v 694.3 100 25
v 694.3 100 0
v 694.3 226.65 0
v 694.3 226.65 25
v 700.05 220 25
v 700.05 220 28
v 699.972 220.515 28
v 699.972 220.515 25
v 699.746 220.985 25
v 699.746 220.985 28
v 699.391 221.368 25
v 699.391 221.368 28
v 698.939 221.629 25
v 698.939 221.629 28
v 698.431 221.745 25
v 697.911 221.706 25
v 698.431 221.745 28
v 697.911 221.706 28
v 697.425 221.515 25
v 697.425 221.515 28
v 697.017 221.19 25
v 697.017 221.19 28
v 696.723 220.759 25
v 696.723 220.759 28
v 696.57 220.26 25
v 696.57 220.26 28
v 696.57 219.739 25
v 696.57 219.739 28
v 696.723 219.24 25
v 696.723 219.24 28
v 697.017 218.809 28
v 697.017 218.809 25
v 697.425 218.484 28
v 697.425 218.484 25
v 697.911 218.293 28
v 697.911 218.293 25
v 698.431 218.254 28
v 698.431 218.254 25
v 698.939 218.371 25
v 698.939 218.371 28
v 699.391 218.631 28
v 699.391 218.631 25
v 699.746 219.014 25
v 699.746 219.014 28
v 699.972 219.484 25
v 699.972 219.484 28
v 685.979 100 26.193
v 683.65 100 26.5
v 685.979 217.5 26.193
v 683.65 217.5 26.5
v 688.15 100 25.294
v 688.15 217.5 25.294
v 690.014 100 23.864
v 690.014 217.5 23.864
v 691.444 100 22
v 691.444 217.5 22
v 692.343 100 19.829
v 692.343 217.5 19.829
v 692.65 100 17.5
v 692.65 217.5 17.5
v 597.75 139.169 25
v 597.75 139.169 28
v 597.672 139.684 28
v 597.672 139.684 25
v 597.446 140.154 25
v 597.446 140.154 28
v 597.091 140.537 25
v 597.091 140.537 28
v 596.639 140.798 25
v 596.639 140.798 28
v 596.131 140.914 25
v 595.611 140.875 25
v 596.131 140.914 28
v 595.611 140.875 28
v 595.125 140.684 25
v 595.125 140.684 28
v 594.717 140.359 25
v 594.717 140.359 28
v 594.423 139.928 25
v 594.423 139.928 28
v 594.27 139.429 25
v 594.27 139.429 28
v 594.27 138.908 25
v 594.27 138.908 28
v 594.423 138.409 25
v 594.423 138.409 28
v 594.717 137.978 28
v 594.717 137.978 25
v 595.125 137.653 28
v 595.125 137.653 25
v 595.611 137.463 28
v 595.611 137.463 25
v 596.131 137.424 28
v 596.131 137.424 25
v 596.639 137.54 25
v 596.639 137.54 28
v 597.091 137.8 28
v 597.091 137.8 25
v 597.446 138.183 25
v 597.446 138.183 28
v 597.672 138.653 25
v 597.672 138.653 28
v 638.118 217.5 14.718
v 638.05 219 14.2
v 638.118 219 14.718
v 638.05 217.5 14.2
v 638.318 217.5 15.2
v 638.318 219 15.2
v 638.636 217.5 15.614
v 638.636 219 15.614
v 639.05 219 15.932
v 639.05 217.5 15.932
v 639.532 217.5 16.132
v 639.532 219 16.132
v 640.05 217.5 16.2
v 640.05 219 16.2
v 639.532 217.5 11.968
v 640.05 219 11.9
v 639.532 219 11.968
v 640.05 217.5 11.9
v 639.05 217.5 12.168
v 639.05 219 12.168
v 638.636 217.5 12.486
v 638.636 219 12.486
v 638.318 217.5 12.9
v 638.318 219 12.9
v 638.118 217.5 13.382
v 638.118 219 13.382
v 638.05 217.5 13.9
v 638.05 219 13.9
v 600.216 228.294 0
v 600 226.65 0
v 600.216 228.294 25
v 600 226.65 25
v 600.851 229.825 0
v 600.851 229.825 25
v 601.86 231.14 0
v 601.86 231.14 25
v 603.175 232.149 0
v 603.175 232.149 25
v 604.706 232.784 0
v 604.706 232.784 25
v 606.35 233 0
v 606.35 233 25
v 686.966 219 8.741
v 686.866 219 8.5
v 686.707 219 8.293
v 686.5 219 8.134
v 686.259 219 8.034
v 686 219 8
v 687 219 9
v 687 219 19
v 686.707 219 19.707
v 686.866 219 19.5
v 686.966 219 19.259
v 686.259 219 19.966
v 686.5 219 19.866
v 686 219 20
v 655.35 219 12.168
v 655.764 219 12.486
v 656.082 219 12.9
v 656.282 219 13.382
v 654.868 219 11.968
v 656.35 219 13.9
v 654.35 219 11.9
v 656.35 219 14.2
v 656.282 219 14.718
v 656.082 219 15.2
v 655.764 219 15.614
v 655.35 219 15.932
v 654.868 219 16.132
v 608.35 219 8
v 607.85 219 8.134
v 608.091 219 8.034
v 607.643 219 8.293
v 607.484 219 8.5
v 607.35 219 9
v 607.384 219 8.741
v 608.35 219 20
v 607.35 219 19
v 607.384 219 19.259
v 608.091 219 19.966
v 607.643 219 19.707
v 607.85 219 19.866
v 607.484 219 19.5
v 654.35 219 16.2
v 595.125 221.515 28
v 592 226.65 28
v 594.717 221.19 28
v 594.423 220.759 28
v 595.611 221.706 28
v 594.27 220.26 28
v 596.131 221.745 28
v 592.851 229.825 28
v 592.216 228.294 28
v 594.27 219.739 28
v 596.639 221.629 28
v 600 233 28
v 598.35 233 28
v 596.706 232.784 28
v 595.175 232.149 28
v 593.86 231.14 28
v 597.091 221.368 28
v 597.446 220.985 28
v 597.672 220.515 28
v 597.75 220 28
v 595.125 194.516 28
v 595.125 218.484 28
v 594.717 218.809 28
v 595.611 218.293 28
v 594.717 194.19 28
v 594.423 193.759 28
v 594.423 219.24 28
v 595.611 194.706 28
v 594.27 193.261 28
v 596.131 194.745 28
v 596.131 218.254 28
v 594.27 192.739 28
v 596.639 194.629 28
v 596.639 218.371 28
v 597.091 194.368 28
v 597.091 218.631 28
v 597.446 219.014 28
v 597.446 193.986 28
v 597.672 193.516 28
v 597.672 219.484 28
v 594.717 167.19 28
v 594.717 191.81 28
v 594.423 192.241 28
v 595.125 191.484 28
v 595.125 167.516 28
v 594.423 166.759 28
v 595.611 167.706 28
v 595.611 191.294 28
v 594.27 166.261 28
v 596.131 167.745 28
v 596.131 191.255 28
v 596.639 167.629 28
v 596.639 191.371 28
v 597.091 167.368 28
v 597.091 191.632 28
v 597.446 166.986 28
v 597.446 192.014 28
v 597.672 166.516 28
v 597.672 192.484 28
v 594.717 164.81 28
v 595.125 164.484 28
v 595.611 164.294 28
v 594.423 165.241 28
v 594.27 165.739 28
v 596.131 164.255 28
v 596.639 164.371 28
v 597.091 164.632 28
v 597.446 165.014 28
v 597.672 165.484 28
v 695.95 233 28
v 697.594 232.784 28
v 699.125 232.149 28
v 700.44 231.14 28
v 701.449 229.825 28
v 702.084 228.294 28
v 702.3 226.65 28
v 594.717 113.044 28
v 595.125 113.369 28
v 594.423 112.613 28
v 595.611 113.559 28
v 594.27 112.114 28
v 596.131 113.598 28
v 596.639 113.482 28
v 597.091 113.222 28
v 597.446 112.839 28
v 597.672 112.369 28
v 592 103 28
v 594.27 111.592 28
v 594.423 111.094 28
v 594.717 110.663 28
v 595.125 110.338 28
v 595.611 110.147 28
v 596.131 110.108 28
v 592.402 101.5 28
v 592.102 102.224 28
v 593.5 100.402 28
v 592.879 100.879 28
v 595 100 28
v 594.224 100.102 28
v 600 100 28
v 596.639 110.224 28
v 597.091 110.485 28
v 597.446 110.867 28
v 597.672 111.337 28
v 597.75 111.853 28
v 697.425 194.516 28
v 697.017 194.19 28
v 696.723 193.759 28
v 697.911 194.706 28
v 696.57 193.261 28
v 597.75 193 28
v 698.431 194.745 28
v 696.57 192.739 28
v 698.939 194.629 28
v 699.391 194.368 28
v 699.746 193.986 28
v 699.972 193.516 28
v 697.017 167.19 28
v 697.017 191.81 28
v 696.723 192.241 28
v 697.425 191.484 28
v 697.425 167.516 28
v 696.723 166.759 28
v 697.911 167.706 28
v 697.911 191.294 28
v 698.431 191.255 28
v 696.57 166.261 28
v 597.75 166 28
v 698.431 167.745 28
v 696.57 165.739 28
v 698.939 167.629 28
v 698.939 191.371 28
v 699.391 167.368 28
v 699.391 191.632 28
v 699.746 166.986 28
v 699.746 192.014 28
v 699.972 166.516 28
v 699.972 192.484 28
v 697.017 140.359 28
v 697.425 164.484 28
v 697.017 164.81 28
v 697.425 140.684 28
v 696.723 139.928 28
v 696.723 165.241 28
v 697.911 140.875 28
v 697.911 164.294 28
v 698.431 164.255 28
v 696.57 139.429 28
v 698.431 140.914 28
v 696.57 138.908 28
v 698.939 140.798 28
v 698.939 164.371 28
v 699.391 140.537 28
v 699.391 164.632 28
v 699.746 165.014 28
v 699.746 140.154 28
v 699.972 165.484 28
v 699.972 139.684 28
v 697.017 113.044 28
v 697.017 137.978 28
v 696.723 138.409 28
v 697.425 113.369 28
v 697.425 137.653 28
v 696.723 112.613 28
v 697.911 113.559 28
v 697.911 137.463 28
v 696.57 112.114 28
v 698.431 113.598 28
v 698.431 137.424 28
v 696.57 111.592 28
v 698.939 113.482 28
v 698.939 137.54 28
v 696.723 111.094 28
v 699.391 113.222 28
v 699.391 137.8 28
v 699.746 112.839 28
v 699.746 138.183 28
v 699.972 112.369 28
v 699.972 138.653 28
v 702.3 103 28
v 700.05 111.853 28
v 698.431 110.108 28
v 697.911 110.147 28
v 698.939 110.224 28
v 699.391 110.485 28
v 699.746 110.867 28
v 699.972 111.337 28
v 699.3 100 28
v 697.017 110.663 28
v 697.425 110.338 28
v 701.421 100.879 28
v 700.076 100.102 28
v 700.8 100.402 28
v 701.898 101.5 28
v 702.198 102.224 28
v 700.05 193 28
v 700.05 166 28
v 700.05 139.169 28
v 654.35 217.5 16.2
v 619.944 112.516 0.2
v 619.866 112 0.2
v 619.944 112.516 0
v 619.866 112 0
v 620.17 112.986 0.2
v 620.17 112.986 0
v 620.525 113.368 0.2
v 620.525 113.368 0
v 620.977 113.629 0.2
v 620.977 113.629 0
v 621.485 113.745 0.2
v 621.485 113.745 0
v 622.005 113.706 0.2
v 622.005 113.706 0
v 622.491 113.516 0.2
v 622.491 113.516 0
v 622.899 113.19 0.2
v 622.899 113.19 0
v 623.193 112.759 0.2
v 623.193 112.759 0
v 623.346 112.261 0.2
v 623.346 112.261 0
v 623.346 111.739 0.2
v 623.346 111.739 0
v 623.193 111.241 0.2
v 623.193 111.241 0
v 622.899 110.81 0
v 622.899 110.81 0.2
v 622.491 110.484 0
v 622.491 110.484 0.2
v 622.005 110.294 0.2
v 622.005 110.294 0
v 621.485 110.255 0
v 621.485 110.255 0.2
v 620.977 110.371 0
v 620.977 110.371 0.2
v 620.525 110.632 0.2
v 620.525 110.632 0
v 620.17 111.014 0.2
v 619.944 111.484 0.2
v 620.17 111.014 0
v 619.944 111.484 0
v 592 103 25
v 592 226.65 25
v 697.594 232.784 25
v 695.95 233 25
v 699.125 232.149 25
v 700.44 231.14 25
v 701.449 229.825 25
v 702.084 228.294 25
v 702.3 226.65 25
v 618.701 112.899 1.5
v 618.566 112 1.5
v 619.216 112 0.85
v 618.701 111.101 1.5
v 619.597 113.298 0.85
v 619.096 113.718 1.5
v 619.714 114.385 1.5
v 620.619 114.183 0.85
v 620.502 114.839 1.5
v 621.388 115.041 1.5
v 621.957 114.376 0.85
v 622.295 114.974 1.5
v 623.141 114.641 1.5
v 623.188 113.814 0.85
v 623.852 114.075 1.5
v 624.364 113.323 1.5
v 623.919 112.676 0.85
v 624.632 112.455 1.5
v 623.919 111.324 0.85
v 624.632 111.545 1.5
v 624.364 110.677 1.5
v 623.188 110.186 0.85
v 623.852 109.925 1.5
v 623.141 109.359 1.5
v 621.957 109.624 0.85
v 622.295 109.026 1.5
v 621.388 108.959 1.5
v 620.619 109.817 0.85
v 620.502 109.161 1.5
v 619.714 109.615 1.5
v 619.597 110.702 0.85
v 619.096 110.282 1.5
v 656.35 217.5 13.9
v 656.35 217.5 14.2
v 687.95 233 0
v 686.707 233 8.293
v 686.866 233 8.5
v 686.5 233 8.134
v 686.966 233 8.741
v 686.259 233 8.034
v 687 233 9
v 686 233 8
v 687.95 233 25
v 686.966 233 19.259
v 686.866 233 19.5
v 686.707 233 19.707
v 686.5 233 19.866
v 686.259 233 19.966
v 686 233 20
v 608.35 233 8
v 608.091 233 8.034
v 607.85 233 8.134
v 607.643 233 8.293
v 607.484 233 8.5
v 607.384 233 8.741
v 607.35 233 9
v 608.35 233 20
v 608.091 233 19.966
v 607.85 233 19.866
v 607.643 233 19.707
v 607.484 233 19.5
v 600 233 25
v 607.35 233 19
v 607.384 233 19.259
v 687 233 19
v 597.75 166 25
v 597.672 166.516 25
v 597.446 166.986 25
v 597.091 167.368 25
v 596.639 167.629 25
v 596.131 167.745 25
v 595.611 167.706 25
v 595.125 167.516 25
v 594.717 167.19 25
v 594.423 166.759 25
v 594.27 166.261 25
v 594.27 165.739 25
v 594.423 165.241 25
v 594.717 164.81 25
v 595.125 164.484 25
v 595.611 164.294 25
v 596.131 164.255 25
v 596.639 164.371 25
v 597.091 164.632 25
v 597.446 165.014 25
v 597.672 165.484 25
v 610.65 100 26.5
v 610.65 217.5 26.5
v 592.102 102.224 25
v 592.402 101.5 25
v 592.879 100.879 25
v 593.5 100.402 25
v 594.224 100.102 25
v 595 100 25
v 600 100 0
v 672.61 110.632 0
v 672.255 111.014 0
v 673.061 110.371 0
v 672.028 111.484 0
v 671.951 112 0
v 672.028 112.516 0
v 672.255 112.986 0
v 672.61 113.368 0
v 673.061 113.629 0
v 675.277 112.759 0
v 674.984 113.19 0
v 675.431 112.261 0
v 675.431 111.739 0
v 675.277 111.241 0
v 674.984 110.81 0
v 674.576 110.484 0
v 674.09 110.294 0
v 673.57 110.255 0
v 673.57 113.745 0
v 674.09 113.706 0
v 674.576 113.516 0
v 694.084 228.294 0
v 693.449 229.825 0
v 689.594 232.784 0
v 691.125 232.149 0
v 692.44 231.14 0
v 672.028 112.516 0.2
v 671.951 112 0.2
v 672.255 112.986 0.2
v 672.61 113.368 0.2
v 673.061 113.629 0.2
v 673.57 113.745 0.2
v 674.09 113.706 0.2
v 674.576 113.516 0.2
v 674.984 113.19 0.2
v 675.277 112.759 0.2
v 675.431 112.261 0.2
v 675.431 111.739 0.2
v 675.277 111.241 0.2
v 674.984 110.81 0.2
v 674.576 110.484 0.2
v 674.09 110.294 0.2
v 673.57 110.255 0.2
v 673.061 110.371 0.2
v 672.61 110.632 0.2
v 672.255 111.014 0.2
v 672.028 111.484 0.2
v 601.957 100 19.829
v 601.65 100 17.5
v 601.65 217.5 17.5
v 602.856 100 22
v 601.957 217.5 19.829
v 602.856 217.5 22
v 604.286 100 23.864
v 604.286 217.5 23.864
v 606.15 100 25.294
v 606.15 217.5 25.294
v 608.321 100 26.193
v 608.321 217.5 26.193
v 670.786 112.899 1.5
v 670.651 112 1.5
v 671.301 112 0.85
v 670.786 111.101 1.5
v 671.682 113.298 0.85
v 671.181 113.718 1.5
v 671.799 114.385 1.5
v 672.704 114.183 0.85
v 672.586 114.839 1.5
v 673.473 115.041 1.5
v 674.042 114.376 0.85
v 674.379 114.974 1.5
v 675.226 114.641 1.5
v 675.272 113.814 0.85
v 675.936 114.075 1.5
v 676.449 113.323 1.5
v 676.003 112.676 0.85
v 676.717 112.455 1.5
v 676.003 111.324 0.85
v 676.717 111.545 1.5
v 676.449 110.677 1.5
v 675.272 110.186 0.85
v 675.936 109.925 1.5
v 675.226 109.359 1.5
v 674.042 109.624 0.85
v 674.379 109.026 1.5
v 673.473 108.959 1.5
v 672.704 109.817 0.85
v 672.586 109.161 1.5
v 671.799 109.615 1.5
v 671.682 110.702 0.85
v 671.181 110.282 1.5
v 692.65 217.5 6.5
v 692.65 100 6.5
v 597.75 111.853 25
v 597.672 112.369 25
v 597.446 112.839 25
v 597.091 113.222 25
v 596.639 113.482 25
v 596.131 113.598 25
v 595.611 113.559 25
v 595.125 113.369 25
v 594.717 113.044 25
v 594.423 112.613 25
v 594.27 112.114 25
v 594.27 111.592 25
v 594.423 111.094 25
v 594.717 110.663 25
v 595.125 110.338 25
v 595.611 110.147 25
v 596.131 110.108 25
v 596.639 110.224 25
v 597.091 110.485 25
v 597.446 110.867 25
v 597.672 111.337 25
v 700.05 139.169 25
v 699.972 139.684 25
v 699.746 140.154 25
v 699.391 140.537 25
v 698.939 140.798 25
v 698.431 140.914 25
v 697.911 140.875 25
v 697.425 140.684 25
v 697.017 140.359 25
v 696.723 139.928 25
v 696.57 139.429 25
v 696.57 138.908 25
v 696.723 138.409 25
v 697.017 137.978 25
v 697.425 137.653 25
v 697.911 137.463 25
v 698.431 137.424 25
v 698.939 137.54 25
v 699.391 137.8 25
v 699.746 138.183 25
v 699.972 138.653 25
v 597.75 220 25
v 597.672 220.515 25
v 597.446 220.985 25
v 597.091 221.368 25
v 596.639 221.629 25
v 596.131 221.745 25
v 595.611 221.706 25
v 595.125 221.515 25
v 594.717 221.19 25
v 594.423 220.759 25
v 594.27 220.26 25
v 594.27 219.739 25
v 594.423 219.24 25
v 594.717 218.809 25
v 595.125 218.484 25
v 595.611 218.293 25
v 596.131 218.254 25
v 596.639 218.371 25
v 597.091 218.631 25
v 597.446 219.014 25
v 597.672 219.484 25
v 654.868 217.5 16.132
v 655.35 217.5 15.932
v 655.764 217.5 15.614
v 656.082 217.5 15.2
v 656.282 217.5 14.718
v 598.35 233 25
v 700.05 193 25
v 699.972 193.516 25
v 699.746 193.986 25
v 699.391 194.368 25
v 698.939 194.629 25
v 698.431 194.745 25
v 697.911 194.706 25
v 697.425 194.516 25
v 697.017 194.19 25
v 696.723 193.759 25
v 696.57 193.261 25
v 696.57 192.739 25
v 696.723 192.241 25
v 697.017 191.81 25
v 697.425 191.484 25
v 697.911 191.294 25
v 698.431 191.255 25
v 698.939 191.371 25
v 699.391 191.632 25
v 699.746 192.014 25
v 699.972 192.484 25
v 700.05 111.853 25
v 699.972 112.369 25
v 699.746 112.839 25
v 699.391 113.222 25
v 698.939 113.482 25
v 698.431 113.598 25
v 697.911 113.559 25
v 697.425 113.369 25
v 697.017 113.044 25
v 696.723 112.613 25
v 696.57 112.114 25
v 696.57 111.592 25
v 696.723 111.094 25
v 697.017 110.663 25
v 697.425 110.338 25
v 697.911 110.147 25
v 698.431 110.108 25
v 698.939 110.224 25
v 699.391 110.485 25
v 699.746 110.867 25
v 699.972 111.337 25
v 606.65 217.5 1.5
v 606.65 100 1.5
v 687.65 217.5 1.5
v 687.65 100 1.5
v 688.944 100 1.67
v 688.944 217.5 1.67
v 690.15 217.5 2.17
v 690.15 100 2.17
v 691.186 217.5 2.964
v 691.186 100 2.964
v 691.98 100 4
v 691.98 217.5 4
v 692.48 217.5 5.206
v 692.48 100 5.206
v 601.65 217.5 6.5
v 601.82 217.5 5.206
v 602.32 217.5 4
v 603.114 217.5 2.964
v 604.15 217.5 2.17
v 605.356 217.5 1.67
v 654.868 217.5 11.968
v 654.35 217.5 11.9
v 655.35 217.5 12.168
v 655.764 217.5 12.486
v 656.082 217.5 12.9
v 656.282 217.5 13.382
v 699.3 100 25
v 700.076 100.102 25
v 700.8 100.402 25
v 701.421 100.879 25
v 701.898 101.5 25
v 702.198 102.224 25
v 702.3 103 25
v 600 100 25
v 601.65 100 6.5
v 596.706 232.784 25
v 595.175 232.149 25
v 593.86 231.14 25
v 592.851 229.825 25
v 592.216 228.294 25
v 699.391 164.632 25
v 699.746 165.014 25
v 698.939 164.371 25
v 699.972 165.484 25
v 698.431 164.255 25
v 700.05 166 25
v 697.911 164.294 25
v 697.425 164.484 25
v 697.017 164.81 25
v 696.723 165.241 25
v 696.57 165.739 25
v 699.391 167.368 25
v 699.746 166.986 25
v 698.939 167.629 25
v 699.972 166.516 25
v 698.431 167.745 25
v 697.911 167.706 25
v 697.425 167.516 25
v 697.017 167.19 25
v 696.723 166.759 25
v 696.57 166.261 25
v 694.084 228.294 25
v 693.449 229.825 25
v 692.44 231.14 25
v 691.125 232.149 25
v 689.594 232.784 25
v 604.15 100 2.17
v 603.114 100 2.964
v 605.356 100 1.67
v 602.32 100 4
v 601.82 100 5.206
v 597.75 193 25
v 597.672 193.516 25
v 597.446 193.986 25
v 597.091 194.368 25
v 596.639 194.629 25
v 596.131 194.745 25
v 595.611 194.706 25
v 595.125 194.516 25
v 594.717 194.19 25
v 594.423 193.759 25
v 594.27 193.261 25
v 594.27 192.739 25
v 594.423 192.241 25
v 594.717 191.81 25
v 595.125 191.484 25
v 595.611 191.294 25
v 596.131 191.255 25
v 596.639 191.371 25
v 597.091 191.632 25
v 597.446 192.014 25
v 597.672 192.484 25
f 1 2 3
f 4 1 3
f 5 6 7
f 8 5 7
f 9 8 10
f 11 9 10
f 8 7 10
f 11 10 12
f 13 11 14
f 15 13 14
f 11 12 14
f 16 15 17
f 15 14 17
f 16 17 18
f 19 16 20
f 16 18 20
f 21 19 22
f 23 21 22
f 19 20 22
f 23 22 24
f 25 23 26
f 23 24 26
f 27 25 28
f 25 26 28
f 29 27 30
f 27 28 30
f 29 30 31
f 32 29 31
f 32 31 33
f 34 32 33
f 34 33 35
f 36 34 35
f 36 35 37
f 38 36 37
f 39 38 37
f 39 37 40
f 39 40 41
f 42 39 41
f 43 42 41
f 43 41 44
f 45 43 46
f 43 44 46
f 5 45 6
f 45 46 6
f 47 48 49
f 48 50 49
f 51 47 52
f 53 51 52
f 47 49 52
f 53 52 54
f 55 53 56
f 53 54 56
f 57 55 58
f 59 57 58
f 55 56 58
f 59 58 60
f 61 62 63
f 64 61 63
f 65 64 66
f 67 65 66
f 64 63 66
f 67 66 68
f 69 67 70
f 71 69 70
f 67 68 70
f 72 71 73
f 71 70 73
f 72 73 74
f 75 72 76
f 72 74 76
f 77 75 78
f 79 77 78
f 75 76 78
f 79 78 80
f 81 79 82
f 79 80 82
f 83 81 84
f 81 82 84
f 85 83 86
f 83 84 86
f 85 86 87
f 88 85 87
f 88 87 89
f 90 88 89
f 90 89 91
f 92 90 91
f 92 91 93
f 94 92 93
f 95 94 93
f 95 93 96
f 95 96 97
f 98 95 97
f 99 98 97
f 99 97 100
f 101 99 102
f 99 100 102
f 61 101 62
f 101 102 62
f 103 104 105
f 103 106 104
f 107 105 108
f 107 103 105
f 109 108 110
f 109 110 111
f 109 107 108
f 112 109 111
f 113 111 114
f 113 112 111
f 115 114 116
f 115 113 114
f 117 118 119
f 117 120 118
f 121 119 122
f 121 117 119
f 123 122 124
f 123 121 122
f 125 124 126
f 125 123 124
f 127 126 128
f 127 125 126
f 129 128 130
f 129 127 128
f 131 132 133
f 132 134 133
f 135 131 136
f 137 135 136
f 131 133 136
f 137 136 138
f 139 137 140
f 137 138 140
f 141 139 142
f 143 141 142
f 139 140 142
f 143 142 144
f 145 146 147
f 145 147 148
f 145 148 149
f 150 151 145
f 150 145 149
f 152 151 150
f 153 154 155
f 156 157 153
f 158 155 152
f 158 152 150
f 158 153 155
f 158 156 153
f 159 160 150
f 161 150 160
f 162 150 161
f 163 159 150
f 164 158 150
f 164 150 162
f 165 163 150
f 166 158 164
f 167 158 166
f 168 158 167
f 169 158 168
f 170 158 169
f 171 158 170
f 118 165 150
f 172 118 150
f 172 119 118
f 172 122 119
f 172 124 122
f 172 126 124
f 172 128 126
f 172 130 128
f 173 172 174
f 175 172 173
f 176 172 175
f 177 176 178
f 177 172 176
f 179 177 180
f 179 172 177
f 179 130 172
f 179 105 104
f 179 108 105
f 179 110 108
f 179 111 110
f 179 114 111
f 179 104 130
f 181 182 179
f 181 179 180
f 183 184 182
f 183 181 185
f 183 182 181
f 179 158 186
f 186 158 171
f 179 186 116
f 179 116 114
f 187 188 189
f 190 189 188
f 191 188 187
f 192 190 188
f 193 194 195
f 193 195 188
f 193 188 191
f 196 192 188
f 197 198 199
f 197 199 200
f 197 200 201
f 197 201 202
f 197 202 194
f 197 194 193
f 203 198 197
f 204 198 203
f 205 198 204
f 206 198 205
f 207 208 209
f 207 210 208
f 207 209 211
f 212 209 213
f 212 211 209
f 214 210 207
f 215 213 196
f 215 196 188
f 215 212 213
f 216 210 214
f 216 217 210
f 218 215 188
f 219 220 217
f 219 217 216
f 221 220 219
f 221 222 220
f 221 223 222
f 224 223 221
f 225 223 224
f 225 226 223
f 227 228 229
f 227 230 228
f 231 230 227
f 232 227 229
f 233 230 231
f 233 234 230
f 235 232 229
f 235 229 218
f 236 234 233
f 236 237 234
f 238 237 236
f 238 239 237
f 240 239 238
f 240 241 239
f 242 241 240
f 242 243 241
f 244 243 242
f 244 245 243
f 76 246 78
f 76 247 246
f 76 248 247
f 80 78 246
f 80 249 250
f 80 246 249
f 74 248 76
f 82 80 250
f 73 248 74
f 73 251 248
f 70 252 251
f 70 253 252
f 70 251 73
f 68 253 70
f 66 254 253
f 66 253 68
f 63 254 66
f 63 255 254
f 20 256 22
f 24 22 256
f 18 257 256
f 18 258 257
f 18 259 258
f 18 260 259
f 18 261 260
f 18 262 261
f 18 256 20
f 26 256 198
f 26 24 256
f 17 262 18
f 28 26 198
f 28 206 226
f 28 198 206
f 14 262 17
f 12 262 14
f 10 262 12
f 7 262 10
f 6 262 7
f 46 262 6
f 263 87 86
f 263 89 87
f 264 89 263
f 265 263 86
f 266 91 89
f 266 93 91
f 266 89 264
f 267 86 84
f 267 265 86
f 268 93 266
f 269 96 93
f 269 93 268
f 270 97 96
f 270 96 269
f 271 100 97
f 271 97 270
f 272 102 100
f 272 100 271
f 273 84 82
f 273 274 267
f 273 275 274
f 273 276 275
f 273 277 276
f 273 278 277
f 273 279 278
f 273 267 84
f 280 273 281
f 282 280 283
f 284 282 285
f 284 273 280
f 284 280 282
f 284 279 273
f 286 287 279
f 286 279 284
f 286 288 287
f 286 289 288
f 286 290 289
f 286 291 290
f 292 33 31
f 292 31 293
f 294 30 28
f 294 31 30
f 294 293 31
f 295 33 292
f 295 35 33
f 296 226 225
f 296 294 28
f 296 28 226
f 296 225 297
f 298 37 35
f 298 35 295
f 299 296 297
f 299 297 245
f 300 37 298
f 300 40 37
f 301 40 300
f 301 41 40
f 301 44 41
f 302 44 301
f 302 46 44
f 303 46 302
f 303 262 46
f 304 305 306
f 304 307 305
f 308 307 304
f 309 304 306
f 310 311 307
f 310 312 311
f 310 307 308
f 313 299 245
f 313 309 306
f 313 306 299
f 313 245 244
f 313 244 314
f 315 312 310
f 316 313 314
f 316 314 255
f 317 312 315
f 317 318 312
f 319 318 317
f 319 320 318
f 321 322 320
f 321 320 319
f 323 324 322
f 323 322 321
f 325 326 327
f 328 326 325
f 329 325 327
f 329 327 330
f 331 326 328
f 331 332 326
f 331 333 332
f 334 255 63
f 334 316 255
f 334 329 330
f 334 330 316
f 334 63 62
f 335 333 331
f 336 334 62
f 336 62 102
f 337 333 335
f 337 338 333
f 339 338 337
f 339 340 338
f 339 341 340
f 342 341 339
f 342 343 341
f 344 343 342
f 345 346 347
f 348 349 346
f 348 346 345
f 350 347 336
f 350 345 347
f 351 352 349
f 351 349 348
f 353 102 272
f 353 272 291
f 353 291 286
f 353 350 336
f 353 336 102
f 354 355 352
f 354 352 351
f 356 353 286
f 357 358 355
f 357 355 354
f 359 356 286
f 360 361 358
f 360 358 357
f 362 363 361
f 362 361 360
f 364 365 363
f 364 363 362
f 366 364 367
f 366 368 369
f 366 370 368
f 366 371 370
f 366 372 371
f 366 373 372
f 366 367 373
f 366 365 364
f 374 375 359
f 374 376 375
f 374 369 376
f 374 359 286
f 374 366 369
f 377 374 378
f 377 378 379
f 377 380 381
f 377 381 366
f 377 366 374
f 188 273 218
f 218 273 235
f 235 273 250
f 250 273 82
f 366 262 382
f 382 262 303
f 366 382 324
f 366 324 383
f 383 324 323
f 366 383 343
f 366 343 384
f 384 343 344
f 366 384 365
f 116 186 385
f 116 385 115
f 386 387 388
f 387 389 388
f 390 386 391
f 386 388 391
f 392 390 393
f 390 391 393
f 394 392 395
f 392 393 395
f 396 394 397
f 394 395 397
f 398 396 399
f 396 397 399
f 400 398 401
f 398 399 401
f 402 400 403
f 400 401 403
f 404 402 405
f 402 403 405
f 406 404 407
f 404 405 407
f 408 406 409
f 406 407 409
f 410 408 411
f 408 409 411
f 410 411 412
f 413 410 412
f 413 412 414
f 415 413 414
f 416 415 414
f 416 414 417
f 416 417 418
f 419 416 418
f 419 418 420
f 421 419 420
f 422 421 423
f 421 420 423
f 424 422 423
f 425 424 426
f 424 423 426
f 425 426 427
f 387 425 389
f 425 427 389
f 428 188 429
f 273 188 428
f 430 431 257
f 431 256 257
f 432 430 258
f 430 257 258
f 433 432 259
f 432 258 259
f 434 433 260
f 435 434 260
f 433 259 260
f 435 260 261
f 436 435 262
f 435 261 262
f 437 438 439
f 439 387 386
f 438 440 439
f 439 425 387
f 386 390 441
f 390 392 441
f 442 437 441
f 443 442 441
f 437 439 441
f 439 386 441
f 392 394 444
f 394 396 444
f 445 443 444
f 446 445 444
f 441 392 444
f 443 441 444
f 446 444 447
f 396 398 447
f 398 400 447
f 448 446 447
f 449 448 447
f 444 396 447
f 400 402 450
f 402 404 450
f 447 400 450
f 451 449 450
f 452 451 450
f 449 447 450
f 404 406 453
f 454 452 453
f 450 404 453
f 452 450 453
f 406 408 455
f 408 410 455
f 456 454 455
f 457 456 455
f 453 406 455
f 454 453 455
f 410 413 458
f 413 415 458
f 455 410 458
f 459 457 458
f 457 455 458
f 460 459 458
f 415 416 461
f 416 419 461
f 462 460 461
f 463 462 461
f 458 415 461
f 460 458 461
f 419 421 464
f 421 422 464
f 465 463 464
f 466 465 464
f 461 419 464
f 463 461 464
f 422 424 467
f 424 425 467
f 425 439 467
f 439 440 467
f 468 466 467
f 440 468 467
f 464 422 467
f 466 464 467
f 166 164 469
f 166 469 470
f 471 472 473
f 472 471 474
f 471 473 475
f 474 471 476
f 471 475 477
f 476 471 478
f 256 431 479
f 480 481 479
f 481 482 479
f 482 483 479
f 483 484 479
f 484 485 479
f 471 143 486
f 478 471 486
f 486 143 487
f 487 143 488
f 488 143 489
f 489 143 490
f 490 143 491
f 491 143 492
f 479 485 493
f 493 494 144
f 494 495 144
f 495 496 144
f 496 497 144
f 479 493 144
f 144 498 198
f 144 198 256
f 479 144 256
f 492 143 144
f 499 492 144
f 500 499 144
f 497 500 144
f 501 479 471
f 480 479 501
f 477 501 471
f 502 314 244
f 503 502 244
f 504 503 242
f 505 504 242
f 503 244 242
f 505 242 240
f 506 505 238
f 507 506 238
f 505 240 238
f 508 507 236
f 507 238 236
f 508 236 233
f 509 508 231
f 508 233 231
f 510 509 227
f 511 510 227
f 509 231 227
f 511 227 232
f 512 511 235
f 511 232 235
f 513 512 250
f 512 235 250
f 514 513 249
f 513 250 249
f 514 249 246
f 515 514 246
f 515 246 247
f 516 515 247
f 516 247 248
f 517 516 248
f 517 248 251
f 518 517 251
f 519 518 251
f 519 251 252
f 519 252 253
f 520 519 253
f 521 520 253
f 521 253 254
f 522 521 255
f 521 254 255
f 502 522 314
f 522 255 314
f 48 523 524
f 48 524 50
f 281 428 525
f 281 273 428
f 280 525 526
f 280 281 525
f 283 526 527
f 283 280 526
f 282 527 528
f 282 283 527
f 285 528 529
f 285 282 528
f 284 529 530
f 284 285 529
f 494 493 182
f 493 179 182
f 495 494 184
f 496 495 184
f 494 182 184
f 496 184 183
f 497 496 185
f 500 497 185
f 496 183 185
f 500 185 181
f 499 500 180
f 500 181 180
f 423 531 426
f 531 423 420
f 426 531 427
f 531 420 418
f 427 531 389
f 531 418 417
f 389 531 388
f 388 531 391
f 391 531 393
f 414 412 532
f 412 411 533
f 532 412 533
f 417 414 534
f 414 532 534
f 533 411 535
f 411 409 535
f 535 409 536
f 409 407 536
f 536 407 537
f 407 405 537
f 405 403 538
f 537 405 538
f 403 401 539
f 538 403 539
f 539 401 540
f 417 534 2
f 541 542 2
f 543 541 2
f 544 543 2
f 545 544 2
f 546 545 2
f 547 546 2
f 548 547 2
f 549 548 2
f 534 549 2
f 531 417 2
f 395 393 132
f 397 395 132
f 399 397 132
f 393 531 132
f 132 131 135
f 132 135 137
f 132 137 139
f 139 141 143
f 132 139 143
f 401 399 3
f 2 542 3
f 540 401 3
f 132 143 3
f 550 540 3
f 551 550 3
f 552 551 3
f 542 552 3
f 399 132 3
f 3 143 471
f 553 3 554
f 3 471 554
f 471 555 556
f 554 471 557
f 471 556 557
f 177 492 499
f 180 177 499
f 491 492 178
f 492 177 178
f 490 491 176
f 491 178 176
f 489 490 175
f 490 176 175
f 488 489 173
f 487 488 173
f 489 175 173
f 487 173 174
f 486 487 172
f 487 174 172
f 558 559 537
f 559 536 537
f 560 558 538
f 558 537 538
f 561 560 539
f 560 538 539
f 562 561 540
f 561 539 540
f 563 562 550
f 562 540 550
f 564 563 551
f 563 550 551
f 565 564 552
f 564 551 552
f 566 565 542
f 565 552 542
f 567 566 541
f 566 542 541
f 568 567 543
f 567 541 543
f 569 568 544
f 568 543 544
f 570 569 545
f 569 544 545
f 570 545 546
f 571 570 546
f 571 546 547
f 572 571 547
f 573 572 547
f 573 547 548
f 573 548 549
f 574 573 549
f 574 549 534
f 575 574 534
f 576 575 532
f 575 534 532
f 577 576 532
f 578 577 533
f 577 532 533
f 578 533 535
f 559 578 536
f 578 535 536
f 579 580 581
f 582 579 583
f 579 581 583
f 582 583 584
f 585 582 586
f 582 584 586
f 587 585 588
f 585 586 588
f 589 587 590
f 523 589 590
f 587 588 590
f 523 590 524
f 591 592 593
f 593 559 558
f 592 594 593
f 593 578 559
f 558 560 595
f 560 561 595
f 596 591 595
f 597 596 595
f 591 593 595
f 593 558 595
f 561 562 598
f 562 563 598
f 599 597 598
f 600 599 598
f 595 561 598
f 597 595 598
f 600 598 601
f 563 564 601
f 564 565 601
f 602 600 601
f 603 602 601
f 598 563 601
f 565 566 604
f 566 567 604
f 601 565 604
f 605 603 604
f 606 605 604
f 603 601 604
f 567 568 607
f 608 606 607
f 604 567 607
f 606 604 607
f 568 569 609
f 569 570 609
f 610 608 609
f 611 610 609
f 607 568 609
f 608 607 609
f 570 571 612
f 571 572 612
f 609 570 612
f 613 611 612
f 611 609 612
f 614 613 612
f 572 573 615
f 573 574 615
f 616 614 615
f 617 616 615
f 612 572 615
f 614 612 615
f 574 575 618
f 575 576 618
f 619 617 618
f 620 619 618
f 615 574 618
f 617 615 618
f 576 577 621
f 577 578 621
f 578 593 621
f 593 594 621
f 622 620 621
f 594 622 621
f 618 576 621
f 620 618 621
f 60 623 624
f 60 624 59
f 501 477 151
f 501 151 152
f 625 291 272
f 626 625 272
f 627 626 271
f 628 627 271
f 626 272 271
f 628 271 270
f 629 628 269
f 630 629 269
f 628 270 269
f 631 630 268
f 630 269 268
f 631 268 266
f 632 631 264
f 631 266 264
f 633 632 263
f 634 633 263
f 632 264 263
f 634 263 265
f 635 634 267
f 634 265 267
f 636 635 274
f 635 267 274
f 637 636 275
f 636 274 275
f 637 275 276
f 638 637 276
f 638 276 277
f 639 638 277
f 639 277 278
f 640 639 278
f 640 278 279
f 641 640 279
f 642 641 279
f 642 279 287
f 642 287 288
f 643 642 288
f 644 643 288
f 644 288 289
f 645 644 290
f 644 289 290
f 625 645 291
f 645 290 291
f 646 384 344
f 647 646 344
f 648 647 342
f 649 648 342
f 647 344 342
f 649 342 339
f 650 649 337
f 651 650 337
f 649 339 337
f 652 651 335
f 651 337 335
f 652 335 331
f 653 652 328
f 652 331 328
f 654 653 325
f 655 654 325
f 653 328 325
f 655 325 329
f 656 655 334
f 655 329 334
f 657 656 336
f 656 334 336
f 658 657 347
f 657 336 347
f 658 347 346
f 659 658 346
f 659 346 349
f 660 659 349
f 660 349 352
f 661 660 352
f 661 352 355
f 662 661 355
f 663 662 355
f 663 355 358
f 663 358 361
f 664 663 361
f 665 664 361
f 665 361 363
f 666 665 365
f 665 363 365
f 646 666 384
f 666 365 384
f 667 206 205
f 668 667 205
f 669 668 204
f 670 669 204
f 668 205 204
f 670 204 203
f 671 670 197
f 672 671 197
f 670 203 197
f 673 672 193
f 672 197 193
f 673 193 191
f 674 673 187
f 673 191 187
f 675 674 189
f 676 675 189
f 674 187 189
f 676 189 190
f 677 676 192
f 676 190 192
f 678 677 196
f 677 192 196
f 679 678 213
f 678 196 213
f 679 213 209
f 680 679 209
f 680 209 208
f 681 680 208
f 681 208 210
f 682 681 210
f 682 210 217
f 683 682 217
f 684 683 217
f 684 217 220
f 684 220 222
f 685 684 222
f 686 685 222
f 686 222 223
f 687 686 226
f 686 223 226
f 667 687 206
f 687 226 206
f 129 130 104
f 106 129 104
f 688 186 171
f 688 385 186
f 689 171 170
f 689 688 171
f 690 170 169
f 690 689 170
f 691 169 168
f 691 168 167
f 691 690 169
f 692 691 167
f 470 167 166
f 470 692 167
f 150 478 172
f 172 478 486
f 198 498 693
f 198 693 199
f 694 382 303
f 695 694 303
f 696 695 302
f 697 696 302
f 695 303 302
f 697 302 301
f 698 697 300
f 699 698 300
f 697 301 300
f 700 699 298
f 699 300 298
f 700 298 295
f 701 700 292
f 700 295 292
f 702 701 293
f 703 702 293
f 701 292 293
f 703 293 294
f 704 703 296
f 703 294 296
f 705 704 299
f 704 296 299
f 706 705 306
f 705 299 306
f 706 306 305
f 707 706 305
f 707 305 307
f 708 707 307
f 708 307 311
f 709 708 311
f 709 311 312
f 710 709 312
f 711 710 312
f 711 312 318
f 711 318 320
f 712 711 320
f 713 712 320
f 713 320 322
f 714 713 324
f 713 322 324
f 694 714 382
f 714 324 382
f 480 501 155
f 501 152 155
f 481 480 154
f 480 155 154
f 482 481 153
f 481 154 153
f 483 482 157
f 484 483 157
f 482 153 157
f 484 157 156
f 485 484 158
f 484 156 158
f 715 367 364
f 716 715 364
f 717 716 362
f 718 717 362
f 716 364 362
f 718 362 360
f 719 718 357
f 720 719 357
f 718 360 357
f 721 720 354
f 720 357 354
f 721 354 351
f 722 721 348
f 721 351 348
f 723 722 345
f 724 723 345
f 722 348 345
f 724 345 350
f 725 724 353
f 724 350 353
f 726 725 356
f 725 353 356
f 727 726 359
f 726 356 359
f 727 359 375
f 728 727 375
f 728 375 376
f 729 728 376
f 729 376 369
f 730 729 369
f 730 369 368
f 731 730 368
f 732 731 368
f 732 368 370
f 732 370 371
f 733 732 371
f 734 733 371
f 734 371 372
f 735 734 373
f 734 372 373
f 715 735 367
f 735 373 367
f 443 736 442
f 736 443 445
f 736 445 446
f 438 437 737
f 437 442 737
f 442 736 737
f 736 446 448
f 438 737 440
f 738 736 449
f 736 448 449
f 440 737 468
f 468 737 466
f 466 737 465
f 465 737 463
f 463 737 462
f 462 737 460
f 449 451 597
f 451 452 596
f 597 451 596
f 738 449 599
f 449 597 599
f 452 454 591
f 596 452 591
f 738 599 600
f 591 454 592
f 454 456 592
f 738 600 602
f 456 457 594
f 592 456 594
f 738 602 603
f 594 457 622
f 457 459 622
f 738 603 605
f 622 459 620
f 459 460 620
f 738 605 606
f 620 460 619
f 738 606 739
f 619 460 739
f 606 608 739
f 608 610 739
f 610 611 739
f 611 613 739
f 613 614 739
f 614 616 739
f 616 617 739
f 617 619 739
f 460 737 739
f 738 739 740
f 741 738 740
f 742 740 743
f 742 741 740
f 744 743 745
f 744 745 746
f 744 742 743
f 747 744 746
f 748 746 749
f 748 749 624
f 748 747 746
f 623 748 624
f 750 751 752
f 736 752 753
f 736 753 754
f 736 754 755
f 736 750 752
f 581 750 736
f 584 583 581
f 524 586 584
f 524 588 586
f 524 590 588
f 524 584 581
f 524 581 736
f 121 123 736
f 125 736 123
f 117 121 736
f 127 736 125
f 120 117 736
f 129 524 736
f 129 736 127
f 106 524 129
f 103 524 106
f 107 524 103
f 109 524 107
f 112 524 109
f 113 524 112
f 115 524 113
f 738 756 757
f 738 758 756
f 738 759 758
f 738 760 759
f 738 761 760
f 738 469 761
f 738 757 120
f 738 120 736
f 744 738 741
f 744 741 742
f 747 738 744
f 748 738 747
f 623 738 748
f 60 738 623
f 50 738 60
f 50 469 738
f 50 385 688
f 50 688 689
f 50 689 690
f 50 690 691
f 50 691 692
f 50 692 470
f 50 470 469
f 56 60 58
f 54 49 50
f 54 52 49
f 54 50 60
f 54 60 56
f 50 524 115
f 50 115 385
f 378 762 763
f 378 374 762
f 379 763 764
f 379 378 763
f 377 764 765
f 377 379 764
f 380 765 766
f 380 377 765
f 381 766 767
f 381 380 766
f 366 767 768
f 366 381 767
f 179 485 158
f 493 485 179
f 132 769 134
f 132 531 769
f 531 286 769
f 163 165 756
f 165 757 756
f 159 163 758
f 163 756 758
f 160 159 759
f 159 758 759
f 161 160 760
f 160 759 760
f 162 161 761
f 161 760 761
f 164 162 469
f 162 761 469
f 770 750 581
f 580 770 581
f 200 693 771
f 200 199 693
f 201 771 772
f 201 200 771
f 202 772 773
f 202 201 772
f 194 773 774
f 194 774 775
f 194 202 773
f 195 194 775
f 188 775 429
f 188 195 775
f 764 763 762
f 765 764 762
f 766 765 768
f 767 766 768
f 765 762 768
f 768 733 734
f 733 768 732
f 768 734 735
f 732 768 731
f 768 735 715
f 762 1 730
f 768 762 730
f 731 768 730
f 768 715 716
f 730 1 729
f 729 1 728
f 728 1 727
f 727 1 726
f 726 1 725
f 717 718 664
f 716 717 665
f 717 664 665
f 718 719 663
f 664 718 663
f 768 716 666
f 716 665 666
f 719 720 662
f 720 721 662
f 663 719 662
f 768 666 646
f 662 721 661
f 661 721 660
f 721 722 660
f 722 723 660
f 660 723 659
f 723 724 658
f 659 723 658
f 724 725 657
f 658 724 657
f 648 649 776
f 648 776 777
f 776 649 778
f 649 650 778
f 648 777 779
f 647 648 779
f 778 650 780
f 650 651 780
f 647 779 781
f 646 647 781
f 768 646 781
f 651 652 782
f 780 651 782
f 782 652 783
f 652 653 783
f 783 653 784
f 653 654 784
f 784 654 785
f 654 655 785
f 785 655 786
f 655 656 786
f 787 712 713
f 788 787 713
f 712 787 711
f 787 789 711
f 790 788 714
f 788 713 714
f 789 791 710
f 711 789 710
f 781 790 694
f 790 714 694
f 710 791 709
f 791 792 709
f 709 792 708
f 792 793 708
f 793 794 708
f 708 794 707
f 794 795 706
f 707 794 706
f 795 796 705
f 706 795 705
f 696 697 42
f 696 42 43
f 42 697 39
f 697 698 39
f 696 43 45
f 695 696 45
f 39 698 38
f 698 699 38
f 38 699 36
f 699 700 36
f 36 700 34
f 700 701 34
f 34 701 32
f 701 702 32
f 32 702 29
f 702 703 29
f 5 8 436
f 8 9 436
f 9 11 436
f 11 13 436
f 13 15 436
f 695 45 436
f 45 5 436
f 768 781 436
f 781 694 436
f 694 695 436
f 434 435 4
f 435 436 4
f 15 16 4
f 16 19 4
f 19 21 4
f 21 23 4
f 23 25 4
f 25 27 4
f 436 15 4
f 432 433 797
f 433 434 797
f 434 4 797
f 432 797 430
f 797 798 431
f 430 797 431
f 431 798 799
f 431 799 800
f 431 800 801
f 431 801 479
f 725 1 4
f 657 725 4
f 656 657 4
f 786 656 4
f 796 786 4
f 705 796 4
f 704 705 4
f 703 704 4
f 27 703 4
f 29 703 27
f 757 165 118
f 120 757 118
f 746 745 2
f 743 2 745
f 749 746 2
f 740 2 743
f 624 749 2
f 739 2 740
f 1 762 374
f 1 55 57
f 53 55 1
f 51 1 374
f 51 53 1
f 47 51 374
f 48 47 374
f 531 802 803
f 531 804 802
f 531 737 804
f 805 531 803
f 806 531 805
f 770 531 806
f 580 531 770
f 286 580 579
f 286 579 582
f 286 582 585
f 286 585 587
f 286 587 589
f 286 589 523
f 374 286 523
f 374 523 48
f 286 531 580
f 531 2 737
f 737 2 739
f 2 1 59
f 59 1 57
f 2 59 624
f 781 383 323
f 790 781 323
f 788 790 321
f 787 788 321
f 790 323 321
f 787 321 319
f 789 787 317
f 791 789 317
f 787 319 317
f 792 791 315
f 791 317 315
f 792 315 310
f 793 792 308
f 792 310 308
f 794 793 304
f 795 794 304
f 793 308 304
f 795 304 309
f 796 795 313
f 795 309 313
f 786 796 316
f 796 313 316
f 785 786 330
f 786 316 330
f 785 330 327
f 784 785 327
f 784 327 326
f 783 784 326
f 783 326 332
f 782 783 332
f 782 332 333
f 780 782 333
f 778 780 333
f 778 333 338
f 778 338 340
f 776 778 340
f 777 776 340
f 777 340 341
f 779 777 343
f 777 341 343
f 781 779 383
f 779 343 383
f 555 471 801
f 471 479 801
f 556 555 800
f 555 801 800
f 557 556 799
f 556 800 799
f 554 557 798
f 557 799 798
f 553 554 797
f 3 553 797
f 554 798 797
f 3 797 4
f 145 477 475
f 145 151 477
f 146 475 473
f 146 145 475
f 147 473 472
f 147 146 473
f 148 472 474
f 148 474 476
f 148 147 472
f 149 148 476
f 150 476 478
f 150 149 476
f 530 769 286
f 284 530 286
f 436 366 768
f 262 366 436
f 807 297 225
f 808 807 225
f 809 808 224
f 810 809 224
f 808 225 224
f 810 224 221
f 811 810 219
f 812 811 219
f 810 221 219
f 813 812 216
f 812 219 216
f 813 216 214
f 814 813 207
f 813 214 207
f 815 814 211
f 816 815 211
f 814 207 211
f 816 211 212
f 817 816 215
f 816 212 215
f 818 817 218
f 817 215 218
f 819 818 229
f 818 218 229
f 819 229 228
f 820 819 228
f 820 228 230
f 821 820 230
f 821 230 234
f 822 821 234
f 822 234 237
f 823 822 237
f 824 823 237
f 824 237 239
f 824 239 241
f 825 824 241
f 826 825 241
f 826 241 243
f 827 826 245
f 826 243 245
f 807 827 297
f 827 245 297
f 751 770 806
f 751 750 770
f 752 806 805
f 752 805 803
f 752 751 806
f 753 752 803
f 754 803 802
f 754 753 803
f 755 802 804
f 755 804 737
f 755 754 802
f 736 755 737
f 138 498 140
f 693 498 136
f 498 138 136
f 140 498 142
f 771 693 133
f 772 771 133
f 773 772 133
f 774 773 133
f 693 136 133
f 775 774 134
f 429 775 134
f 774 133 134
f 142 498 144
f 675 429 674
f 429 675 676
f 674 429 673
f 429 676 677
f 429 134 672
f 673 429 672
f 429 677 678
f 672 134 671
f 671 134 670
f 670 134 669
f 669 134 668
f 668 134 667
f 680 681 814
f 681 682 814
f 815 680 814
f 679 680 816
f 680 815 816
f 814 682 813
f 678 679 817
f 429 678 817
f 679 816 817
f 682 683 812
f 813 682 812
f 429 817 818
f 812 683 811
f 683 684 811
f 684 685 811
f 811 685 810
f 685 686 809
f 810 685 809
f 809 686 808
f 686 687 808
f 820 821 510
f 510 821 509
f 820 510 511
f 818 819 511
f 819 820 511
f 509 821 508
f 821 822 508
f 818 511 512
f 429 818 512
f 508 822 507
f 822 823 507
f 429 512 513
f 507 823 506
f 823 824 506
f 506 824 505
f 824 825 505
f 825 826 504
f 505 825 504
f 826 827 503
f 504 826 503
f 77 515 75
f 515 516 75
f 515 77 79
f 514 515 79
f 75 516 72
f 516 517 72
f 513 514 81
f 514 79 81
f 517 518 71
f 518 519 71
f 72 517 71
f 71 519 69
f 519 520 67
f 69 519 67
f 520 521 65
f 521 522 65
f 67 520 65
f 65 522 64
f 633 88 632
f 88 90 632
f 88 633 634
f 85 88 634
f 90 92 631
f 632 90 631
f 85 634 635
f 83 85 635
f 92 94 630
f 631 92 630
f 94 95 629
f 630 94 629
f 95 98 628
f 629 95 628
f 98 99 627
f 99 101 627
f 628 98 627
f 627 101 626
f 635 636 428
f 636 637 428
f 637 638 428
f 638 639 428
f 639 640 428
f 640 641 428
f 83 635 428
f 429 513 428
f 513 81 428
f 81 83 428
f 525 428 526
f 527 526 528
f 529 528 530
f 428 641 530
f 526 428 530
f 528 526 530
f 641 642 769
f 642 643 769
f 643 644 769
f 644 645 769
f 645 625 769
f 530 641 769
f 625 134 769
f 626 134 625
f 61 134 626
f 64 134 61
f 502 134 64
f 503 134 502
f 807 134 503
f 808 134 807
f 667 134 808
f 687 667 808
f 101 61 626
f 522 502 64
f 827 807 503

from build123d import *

# Parameters (mm, degrees)
SKETCH154_W      = 94.3
SKETCH154_H      = 133
PAD011_DEPTH     = 28
SKETCH155_W      = 91
SKETCH155_H      = 25
POCKET032_DEPTH  = 117.5
FILLET010_R      = 9
FILLET011_R      = 5
SKETCH157_W      = 133
SKETCH157_H      = 3
PAD012_DEPTH     = 8
SKETCH158_W      = 133
SKETCH158_H      = 3
PAD013_DEPTH     = 8
FILLET012_R      = 6.35
SKETCH159_W      = 79.65001
SKETCH159_H      = 12
POCKET033_DEPTH  = 14
SKETCH160_W      = 18.3
SKETCH160_H      = 4.3
POCKET034_DEPTH  = 2
FILLET013_R      = 2
SKETCH164_R      = 1.75
POCKET037_DEPTH  = 3
FILLET017_R      = 3
FILLET018_R      = 1
HOLE_D           = 3.5
HOLE_DEPTH       = 25
HOLE_CSINK_D     = 6.1
HOLE_CSINK_ANGLE = 90


with BuildPart() as part:
    # Sketch154 → Pad011 (new body)
    with BuildSketch(Plane.XY):
        with Locations((647.15, 166.5)):
            Rectangle(SKETCH154_W, SKETCH154_H)
    extrude(amount=PAD011_DEPTH)

    # Sketch155 (on Face1 of Pad011) → Pocket032 (cut)
    with BuildSketch(Plane.XZ.offset(-100)):
        with Locations((647.149987, 13.999999)):
            Rectangle(SKETCH155_W, SKETCH155_H)
    extrude(amount=-POCKET032_DEPTH, mode=Mode.SUBTRACT)

    # Fillet010
    fillet010_edges = [part.edges().sort_by_distance(p)[0] for p in [
        (692.649987, 158.75, 26.499999),
        (601.649987, 158.75, 26.499999),
    ]]
    fillet(fillet010_edges, radius=FILLET010_R)

    # Fillet011
    fillet011_edges = [part.edges().sort_by_distance(p)[0] for p in [
        (601.649987, 158.75, 1.499999),
        (692.649987, 158.75, 1.499999),
    ]]
    fillet(fillet011_edges, radius=FILLET011_R)

    # Sketch157 (on Face13 of Fillet011) → Pad012 (join)
    with BuildSketch(Plane.YZ.offset(694.3)):
        with Locations((166.5, 26.5)):
            Rectangle(SKETCH157_W, SKETCH157_H)
    extrude(amount=PAD012_DEPTH)

    # Sketch158 (on Face10 of Pad012) → Pad013 (join)
    with BuildSketch(Plane(origin=(600, 0, 0), x_dir=(0, -1, 0), z_dir=(-1, 0, 0))):
        with Locations((-166.500003, 26.5)):
            Rectangle(SKETCH158_W, SKETCH158_H)
    extrude(amount=PAD013_DEPTH)

    # Fillet012
    fillet012_edges = [part.edges().sort_by_distance(p)[0] for p in [
        (600, 233, 12.5),
        (694.3, 233, 12.5),
        (702.3, 233, 26.5),
        (592, 233.000003, 26.5),
    ]]
    fillet(fillet012_edges, radius=FILLET012_R)

    # Sketch159 (on Face10 of Fillet012) → Pocket033 (cut)
    with BuildSketch(Plane(origin=(0, 233, 0), x_dir=(-1, 0, 0), z_dir=(0, 1, 0))):
        with Locations((-647.174991, 14)):
            Rectangle(SKETCH159_W, SKETCH159_H)
    extrude(amount=-POCKET033_DEPTH, mode=Mode.SUBTRACT)

    # Sketch160 (on Face35 of Pocket033) → Pocket034 (cut)
    with BuildSketch(Plane(origin=(0, 219, 0), x_dir=(-1, 0, 0), z_dir=(0, 1, 0))):
        with Locations((-647.199985, 14.05)):
            Rectangle(SKETCH160_W, SKETCH160_H)
    extrude(amount=-POCKET034_DEPTH, mode=Mode.SUBTRACT)

    # Fillet013
    fillet013_edges = [part.edges().sort_by_distance(p)[0] for p in [
        (638.049985, 218.25, 11.9),
        (638.049985, 218.25, 16.2),
        (656.349985, 218.25, 16.2),
        (656.349985, 218.25, 11.9),
    ]]
    fillet(fillet013_edges, radius=FILLET013_R)

    # Sketch164 (on Face26 of Fillet013) → Pocket037 (cut)
    with BuildSketch(Plane.XY.offset(28)):
        with Locations((698.30001, 111.85331)):
            Circle(SKETCH164_R)
        with Locations((596, 111.85331)):
            Circle(SKETCH164_R)
        with Locations((596, 139.168671)):
            Circle(SKETCH164_R)
        with Locations((698.30001, 139.168671)):
            Circle(SKETCH164_R)
        with Locations((698.30001, 166.000002)):
            Circle(SKETCH164_R)
        with Locations((698.30001, 193)):
            Circle(SKETCH164_R)
        with Locations((698.30001, 219.999573)):
            Circle(SKETCH164_R)
        with Locations((596, 219.999573)):
            Circle(SKETCH164_R)
        with Locations((596, 193)):
            Circle(SKETCH164_R)
        with Locations((596, 166)):
            Circle(SKETCH164_R)
    extrude(amount=-POCKET037_DEPTH, mode=Mode.SUBTRACT)

    # Fillet017
    fillet017_edges = [part.edges().sort_by_distance(p)[0] for p in [
        (592, 100.000003, 26.5),
        (702.3, 100, 26.5),
    ]]
    fillet(fillet017_edges, radius=FILLET017_R)

    # Fillet018
    fillet018_edges = [part.edges().sort_by_distance(p)[0] for p in [
        (607.349986, 226, 20),
        (607.349986, 226, 8),
        (686.999996, 226, 8),
        (686.999996, 226, 20),
    ]]
    fillet(fillet018_edges, radius=FILLET018_R)

    # Hole
    with Locations(Plane.XY.offset(1.499999)):
        with Locations((621.615906, 112), (673.700684, 112)):
            CounterSinkHole(HOLE_D / 2, HOLE_CSINK_D / 2, depth=HOLE_DEPTH, counter_sink_angle=HOLE_CSINK_ANGLE)


solid = part.part
